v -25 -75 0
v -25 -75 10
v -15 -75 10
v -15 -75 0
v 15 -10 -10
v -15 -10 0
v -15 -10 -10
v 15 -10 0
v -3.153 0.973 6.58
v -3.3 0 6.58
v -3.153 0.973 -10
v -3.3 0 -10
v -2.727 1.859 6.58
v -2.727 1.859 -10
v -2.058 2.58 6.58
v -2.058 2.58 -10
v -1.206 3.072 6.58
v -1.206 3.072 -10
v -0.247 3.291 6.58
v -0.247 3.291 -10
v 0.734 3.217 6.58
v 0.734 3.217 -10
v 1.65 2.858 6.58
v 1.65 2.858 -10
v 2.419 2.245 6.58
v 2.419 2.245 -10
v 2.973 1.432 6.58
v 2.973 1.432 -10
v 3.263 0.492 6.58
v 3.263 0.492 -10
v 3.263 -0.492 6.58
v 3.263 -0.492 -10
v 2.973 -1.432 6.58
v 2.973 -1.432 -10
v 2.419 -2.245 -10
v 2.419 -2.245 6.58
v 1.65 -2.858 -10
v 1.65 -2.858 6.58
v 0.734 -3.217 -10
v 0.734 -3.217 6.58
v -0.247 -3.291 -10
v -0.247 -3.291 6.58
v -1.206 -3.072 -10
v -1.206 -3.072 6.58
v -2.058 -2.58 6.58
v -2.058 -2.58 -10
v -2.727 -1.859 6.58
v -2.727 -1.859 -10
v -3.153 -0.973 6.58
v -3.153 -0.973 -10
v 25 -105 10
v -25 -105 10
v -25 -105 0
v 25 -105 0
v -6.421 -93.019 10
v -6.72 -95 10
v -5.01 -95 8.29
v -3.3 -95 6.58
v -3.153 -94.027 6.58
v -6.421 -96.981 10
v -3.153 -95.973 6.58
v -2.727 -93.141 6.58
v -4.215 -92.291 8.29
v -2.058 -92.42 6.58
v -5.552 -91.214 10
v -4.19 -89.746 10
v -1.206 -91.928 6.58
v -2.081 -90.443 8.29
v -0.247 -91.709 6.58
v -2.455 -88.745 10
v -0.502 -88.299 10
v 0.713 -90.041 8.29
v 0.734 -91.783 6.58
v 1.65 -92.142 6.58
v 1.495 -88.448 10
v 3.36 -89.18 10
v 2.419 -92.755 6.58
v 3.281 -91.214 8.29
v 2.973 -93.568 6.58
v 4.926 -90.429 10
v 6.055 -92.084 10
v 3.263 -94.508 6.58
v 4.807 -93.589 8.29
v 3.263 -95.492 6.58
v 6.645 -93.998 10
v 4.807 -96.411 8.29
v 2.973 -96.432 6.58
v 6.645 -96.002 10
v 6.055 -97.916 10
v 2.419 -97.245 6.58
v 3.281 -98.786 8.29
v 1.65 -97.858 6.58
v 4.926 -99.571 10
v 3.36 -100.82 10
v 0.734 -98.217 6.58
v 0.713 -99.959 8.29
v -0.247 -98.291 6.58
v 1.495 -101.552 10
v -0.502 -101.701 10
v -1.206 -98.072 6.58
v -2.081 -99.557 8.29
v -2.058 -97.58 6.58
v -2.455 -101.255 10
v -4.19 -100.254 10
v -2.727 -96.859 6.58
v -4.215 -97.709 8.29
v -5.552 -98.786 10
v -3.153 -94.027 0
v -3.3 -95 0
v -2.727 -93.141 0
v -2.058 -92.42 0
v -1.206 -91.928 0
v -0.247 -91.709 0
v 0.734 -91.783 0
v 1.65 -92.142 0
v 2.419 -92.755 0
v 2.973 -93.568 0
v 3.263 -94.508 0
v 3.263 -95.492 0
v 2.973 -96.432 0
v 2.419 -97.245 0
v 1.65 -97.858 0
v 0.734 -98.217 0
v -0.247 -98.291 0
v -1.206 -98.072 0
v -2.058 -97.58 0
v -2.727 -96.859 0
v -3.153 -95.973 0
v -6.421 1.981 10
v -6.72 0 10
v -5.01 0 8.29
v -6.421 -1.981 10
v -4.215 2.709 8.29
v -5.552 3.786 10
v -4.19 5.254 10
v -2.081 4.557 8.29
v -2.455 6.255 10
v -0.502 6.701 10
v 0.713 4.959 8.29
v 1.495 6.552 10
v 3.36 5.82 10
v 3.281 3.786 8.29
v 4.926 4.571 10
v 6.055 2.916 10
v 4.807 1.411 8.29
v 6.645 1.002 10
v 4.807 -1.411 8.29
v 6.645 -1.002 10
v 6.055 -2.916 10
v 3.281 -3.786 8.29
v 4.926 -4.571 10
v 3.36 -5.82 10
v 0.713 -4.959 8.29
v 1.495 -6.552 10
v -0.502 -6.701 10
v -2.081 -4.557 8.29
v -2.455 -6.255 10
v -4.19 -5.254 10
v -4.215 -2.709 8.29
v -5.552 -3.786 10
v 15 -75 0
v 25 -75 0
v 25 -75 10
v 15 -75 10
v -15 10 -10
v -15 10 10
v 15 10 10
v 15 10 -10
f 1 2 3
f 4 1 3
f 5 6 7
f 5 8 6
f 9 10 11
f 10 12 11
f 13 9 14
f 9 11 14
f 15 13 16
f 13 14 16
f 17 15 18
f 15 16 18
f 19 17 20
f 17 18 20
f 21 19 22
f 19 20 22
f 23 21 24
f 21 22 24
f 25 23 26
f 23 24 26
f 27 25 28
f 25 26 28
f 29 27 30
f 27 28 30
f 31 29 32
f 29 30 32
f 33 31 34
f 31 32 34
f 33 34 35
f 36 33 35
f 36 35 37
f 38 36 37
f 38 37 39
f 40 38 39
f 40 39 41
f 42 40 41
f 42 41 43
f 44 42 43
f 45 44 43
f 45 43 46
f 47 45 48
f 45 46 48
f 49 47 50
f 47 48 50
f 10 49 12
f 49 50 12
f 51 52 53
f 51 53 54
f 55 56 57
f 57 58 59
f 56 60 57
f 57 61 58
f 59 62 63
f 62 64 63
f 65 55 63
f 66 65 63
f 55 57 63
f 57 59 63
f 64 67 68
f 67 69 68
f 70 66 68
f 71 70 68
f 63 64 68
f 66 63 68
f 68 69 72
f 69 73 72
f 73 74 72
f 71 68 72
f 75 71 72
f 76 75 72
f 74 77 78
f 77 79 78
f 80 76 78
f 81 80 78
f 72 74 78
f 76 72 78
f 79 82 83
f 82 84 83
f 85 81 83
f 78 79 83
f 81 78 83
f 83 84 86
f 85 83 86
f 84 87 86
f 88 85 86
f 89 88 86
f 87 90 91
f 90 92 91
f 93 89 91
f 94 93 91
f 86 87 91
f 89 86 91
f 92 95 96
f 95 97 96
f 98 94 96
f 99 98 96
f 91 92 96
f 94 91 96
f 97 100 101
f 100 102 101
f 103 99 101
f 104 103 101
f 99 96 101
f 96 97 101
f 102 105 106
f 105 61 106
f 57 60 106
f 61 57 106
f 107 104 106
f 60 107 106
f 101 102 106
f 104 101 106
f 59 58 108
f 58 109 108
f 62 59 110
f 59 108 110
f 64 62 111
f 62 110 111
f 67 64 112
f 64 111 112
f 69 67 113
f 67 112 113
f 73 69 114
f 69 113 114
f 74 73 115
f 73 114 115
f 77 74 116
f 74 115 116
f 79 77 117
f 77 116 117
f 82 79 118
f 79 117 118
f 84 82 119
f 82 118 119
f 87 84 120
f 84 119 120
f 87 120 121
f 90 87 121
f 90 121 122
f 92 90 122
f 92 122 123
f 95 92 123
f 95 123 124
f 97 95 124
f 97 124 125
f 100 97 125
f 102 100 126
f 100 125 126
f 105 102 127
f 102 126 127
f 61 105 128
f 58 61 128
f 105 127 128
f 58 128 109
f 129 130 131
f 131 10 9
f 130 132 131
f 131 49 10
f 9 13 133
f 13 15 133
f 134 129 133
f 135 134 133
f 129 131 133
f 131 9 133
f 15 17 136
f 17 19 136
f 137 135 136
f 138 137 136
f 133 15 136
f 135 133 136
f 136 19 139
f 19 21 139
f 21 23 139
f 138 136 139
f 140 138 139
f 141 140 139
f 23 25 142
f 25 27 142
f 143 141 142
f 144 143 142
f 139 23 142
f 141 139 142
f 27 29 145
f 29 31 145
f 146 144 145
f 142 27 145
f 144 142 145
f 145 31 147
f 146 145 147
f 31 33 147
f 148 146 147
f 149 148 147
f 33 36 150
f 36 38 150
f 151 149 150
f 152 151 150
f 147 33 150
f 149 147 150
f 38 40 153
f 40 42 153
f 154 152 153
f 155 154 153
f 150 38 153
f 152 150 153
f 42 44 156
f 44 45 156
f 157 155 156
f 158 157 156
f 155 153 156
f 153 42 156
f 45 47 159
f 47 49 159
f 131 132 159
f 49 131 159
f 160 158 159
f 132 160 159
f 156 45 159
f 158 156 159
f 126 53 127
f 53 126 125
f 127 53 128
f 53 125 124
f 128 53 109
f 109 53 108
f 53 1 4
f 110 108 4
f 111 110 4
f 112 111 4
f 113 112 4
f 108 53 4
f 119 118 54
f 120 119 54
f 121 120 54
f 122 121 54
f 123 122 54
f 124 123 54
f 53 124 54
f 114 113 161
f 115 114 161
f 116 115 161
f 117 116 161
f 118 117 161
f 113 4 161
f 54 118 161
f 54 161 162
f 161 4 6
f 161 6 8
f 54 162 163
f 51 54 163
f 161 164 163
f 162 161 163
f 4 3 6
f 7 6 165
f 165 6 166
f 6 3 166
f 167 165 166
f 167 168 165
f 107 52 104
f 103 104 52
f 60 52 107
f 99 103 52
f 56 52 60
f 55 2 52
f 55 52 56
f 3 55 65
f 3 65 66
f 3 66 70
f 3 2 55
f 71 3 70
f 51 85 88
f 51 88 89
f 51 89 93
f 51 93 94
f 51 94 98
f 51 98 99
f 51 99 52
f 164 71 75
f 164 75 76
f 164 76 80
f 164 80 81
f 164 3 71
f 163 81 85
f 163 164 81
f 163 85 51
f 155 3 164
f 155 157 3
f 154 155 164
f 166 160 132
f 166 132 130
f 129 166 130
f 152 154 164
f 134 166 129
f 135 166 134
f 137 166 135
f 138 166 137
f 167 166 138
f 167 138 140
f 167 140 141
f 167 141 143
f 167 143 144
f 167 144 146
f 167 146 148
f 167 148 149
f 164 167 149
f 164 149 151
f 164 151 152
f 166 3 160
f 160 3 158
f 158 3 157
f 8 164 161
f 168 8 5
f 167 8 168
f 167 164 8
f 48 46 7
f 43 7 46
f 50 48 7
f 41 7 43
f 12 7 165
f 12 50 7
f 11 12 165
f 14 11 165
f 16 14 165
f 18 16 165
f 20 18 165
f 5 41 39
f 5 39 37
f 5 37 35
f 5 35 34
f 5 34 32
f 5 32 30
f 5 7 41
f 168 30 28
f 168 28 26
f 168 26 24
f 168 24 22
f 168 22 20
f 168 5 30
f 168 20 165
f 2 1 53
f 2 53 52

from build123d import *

# Parameters (mm, degrees)
F1_DEPTH       = 15
F2_W           = 50
F2_H           = 10
F3_DEPTH       = 30
F5_D           = 6.6
F5_DEPTH       = 20
F5_CSINK_D     = 13.44
F5_CSINK_ANGLE = 90
F5_TIP         = 1.9828400428
F7_D           = 6.6
F7_DEPTH       = 10
F7_CSINK_D     = 13.44
F7_CSINK_ANGLE = 90
F7_TIP         = 1.9828400428


with BuildPart() as f1:
    # F0 (on Right) → F1 (new body, symmetric)
    with BuildSketch(Plane.YZ):
        Polygon((10, -10), (10, 10), (-10, 10), (-75, 10), (-75, 0), (-10, 0), (-10, -10), align=None)
    extrude(amount=F1_DEPTH, both=True)

    # F2 (on face) → F3 (join)
    with BuildSketch(Plane.XZ.offset(75)):
        with Locations((0, 5)):
            Rectangle(F2_W, F2_H)
    extrude(amount=F3_DEPTH)

    # F5
    with Locations(Plane.XY.offset(10)):
        with Locations((0, 0)):
            CounterSinkHole(F5_D / 2, F5_CSINK_D / 2, depth=F5_DEPTH, counter_sink_angle=F5_CSINK_ANGLE)
            with Locations((0, 0, -(F5_DEPTH + F5_TIP / 2))):  # 118° drill point
                Cone(0, F5_D / 2, F5_TIP, mode=Mode.SUBTRACT)

    # F7
    with Locations(Plane.XY.offset(10)):
        with Locations((0, -95)):
            CounterSinkHole(F7_D / 2, F7_CSINK_D / 2, depth=F7_DEPTH, counter_sink_angle=F7_CSINK_ANGLE)
            with Locations((0, 0, -(F7_DEPTH + F7_TIP / 2))):  # 118° drill point
                Cone(0, F7_D / 2, F7_TIP, mode=Mode.SUBTRACT)


solid = f1.part
